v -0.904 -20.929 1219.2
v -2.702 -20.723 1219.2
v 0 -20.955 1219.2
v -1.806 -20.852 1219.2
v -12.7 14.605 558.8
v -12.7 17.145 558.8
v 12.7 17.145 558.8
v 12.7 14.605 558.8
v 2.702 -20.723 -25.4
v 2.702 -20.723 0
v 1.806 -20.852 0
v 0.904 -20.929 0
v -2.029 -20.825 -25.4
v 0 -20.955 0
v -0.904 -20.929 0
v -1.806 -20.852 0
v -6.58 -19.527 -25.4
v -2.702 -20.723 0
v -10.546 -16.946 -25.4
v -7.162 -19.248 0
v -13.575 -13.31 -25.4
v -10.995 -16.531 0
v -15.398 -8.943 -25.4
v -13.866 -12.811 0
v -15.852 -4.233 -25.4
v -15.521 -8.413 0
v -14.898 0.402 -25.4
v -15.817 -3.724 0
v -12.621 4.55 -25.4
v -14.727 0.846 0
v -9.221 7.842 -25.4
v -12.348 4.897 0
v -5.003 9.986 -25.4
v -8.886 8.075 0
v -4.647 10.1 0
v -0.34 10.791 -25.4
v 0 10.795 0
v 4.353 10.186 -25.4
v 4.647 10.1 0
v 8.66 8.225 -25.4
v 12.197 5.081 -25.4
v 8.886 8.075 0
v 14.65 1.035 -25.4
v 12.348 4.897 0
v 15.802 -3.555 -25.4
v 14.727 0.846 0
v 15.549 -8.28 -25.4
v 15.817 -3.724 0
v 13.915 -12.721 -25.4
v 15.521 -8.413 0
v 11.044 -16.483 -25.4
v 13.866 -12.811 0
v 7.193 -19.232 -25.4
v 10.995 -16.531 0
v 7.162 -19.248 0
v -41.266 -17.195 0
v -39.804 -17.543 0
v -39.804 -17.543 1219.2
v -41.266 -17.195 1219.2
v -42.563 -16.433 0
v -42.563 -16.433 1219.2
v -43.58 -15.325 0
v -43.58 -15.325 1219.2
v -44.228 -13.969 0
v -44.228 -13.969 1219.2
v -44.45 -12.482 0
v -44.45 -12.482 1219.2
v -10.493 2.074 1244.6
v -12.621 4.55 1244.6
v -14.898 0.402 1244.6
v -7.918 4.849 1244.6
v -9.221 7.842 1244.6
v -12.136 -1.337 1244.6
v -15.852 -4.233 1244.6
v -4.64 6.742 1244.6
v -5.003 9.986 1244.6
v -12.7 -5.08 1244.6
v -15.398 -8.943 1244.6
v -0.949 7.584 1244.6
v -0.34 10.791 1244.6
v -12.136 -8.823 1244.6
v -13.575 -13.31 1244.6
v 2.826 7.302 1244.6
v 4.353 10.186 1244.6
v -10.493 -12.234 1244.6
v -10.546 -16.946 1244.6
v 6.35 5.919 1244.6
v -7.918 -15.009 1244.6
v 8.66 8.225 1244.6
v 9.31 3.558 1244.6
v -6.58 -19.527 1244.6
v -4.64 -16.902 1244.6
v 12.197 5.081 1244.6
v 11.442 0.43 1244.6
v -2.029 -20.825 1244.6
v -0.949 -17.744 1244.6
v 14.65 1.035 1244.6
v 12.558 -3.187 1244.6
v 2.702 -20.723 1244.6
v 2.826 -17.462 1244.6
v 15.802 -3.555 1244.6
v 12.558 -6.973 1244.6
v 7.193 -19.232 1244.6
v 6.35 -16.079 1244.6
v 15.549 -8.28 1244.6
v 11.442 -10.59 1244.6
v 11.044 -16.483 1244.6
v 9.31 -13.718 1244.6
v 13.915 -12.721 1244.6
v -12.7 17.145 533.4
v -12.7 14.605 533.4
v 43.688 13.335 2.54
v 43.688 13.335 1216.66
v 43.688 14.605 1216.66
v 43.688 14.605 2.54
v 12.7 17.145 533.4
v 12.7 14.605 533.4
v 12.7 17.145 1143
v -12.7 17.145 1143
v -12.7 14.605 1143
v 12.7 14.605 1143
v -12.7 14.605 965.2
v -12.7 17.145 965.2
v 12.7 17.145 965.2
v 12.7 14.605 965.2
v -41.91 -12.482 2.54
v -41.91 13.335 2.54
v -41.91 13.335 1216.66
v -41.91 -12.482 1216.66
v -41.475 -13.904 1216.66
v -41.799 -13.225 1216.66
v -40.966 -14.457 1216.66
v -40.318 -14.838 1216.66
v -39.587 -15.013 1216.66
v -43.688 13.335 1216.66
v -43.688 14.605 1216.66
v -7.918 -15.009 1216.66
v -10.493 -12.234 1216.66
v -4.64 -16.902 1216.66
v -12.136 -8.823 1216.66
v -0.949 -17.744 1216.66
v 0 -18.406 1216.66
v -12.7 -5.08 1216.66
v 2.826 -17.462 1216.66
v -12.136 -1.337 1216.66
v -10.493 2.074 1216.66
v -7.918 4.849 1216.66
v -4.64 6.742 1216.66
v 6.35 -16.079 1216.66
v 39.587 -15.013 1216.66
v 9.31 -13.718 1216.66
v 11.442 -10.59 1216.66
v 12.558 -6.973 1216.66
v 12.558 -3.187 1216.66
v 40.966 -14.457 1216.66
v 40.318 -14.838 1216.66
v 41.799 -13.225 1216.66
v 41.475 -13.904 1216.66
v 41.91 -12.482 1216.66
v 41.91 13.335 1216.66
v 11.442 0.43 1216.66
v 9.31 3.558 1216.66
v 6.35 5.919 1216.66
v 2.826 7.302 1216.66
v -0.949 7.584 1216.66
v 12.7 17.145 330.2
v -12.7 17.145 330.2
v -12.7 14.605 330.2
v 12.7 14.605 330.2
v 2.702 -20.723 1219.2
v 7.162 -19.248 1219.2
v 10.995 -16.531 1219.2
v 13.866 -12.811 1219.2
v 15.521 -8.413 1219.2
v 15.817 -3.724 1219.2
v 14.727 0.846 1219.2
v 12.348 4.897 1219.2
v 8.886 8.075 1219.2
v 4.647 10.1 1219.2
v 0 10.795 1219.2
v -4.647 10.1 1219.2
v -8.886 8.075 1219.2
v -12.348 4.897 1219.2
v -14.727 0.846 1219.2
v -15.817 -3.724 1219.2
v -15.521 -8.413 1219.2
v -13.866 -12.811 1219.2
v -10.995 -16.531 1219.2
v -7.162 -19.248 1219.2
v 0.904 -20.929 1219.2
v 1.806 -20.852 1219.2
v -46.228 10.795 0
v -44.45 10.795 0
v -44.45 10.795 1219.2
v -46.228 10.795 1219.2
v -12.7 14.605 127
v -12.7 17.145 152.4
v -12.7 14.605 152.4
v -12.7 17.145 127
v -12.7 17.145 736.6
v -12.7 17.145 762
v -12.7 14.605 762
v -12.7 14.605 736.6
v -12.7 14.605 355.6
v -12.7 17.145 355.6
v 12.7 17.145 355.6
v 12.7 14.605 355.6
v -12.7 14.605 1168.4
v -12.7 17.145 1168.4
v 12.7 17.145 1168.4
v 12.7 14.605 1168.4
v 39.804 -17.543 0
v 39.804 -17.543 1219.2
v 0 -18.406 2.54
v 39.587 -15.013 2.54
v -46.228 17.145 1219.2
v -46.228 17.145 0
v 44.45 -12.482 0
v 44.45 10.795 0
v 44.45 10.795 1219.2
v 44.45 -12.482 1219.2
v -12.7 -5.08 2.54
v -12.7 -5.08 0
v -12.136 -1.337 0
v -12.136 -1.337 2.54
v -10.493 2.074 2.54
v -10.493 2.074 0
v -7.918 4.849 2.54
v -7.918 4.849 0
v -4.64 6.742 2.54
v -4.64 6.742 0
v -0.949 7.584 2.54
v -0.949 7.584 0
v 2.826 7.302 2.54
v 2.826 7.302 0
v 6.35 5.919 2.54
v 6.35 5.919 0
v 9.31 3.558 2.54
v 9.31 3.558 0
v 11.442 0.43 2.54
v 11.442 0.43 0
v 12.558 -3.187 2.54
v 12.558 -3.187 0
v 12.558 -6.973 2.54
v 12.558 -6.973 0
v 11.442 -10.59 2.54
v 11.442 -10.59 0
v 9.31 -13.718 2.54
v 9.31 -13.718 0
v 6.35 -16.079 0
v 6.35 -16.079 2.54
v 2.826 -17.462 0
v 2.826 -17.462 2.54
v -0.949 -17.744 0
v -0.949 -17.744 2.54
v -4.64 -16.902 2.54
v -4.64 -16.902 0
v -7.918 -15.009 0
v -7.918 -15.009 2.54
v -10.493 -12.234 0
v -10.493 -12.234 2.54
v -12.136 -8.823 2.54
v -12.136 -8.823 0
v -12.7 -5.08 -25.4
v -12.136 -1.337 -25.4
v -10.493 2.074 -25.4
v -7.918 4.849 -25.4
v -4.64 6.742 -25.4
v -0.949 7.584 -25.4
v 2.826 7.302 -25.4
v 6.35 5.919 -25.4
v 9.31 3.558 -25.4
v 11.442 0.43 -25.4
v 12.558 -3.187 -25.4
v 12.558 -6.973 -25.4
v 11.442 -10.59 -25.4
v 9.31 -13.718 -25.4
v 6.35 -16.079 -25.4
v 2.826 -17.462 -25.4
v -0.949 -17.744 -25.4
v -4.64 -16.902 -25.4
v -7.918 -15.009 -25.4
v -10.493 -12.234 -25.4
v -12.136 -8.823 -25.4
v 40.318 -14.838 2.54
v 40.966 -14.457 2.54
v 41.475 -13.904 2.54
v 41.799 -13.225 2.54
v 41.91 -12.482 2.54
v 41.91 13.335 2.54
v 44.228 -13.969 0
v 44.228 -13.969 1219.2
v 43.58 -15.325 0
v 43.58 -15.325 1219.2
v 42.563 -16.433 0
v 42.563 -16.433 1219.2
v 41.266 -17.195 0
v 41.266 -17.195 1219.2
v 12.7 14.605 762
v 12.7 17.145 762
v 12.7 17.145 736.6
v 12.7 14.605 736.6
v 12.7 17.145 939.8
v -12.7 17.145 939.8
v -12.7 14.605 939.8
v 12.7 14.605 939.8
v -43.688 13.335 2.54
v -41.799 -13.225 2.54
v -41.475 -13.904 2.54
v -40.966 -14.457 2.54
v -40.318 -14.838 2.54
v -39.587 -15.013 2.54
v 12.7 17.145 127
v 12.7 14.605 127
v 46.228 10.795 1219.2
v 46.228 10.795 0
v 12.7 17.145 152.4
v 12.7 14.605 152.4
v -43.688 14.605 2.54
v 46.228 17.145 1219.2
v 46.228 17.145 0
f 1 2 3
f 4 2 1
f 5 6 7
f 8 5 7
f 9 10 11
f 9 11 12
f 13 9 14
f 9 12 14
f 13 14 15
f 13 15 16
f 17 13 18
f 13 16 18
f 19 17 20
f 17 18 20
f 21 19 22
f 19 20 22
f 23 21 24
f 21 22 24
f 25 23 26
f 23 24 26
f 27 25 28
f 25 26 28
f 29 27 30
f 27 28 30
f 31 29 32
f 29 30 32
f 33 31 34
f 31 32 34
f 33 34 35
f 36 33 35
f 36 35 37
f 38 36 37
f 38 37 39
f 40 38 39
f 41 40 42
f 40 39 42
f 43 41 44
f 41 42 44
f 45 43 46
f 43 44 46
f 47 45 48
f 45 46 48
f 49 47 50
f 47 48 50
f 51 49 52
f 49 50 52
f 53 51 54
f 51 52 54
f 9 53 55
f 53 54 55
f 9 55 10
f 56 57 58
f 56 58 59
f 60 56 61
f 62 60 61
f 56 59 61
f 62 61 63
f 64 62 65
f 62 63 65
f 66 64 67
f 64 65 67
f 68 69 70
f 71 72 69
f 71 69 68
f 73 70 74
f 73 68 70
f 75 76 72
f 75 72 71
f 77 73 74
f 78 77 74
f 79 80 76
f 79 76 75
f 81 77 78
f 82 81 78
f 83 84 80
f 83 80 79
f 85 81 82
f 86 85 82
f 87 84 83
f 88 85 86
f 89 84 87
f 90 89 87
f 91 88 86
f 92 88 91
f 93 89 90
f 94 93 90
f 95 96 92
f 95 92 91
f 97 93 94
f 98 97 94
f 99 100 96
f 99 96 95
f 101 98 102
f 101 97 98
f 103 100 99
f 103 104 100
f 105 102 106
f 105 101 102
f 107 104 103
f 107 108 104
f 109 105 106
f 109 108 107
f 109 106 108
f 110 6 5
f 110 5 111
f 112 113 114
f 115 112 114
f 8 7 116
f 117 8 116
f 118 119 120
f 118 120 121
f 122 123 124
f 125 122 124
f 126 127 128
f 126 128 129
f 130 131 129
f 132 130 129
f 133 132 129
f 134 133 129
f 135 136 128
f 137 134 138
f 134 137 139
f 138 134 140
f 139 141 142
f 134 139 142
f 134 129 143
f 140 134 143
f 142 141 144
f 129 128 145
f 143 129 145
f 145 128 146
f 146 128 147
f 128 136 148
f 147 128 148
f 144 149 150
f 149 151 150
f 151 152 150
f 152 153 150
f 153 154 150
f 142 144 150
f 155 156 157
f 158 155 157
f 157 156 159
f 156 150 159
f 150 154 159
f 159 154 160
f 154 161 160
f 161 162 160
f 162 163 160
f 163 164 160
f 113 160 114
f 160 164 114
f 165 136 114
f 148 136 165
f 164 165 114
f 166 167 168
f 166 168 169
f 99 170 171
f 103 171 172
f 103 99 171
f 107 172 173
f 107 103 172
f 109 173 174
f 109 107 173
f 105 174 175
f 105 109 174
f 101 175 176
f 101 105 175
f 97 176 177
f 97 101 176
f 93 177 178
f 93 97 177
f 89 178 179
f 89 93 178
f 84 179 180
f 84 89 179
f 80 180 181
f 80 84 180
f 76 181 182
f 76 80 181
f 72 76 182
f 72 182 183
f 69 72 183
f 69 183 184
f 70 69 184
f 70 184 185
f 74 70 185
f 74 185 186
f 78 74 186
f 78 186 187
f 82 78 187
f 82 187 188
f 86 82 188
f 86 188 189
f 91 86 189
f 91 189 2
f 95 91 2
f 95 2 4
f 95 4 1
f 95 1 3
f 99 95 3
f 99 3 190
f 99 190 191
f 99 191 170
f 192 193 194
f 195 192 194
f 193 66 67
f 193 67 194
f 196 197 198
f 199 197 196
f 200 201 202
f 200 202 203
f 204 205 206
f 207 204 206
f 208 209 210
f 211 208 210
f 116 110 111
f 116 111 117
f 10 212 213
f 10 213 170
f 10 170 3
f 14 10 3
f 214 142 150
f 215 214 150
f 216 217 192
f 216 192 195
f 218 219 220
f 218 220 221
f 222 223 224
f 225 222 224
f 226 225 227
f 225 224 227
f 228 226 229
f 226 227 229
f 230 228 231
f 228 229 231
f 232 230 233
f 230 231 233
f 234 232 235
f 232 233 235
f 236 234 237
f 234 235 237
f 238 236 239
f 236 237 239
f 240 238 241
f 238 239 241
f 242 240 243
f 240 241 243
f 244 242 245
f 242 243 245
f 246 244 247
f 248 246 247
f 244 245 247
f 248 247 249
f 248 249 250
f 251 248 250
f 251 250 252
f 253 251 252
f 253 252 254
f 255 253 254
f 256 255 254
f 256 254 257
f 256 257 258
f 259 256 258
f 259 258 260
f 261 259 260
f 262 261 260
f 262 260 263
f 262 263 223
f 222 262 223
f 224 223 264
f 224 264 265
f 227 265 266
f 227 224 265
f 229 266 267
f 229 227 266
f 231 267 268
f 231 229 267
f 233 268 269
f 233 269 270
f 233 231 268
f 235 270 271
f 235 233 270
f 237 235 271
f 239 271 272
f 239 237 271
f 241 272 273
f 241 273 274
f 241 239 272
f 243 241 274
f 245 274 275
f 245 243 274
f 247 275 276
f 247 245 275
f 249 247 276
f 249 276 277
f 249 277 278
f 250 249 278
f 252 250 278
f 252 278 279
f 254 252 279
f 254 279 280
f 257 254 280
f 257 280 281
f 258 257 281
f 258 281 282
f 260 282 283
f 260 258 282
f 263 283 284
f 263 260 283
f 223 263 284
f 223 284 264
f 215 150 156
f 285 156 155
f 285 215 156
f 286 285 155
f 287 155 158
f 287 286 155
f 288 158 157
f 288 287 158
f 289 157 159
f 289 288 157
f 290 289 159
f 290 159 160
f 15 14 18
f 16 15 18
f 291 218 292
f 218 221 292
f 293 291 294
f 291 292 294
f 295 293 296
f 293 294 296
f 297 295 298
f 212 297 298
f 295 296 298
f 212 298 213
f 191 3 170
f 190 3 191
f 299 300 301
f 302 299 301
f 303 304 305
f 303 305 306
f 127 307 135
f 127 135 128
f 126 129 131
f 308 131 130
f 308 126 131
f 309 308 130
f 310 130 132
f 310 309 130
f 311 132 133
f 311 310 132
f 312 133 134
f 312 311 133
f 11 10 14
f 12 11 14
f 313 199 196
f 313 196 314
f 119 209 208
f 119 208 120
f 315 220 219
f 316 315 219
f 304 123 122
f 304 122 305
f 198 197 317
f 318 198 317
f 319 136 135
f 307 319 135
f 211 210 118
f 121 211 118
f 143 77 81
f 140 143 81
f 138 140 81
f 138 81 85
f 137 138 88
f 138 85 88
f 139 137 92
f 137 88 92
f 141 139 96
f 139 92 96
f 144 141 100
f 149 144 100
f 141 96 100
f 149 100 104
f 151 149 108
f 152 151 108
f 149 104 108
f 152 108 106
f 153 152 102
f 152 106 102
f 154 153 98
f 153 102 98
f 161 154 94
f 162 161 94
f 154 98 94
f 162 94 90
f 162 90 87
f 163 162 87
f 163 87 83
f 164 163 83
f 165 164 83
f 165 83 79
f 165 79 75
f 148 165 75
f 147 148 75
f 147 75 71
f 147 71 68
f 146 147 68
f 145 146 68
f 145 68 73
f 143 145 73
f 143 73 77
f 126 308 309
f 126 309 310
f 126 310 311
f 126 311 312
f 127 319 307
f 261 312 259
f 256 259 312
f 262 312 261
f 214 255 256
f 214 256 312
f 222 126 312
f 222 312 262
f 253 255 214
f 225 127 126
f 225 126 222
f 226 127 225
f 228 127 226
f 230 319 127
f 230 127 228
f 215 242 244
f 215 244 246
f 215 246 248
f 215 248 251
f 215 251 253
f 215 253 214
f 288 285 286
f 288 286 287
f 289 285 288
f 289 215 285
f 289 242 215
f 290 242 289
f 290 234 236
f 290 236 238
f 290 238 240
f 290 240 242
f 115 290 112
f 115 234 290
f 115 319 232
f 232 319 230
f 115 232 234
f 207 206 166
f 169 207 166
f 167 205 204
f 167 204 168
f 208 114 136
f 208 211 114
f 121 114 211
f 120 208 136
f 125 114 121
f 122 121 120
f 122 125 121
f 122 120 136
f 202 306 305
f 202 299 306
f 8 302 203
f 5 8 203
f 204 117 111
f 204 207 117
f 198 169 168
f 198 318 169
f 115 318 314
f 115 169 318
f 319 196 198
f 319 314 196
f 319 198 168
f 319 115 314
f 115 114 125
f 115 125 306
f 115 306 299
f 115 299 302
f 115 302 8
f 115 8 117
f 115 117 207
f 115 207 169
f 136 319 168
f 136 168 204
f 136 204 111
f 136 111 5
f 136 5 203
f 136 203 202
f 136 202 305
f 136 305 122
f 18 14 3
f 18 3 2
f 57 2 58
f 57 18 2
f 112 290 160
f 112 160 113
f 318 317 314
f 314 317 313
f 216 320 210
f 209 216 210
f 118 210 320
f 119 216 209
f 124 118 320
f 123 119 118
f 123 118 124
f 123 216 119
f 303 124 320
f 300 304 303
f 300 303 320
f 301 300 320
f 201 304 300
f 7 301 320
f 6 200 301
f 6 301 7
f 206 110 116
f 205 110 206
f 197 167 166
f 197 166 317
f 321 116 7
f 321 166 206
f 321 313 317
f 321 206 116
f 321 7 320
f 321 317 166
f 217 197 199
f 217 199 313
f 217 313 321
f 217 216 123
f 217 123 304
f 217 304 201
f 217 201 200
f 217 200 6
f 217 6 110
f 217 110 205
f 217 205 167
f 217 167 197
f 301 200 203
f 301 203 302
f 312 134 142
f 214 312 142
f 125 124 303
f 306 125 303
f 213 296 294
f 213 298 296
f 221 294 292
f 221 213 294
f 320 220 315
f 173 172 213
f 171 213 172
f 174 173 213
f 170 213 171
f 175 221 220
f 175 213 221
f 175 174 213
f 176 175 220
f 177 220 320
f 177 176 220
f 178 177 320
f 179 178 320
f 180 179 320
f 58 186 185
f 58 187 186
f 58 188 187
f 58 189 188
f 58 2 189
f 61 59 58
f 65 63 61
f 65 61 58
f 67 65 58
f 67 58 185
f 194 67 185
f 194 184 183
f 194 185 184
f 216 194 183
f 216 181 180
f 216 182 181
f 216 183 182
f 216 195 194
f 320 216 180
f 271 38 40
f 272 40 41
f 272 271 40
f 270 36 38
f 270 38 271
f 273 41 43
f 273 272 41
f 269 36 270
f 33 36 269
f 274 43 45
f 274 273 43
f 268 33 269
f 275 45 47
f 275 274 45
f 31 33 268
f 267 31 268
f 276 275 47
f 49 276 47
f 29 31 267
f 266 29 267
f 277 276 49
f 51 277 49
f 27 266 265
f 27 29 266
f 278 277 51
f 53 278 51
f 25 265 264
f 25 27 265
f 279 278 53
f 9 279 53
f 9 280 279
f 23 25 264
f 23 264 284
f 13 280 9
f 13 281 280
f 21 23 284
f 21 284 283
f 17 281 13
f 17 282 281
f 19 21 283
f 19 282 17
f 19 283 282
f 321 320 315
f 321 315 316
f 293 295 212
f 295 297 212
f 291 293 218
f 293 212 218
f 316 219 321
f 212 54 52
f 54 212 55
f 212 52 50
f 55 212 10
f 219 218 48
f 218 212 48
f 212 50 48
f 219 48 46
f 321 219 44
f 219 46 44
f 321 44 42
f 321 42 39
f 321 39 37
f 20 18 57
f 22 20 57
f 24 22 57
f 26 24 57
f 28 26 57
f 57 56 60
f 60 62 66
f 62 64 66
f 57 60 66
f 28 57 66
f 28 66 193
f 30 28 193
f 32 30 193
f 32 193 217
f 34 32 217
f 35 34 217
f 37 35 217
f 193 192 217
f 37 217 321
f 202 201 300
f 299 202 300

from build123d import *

# Parameters (mm, degrees)
BOSS_EXTRUDE1_DEPTH = 1219.2
SKETCH3_W           = 1219.2
SKETCH3_H           = 6.35
BOSS_EXTRUDE2_DEPTH = 1.778
SKETCH4_W           = 1219.2
SKETCH4_H           = 6.35
BOSS_EXTRUDE3_DEPTH = 1.778
FILLET1_R           = 5.08
SHELL1_START        = 2.54
SHELL1_DEPTH        = 1214.12
CUT_EXTRUDE1_REACH  = 1222.671
SKETCH6_W           = 25.4
SKETCH6_H           = 25.4
SKETCH7_R           = 15.875
SKETCH7_R_2         = 12.7
BOSS_EXTRUDE4_DEPTH = 25.4
CUT_EXTRUDE2_REACH  = 1222.256
SKETCH10_R          = 12.7
BOSS_EXTRUDE5_START = 25.4
SKETCH11_R          = 15.875
SKETCH11_R_2        = 12.7
BOSS_EXTRUDE5_DEPTH = 25.4
CUT_EXTRUDE3_REACH  = 1247.634
SKETCH12_R          = 12.7


# Read off the part's stored shape, not the designer's step: Shell1
with BuildPart() as part:
    # Sketch1 → Boss-Extrude1 (new body)
    with BuildSketch(Plane.XY):
        Polygon((-44.45, -17.145), (-44.45, 17.145), (44.45, 17.145), (44.45, -17.145), (0, -20.955), align=None)
    extrude(amount=BOSS_EXTRUDE1_DEPTH)

    # Sketch3 → Boss-Extrude2 (add)
    with BuildSketch(Plane.ZY.offset(44.45)):
        with Locations((609.6, 13.97)):
            Rectangle(SKETCH3_W, SKETCH3_H)
    extrude(amount=BOSS_EXTRUDE2_DEPTH)

    # Sketch4 → Boss-Extrude3 (add)
    with BuildSketch(Plane(origin=(44.45, 0, 0), x_dir=(0, 0, -1), z_dir=(1, 0, 0))):
        with Locations((-609.6, 13.97)):
            Rectangle(SKETCH4_W, SKETCH4_H)
    extrude(amount=BOSS_EXTRUDE3_DEPTH)

    # Fillet1
    fillet1_edges = [part.edges().sort_by_distance(p)[0] for p in [
        (44.45, -17.145, 609.6),
        (-44.45, -17.145, 609.6),
    ]]
    fillet(fillet1_edges, radius=FILLET1_R)

    # Shell1 outline → Shell1 (cut)
    with BuildSketch(Plane.XY.offset(SHELL1_START)):
        with BuildLine():
            Line((41.91, -12.481801497), (41.91, 13.335))
            Line((41.91, 13.335), (43.688, 13.335))
            Line((43.688, 13.335), (43.688, 14.605))
            Line((43.688, 14.605), (-43.688, 14.605))
            Line((-43.688, 14.605), (-43.688, 13.335))
            Line((-43.688, 13.335), (-41.91, 13.335))
            Line((-41.91, 13.335), (-41.91, -12.481801497))
            ThreePointArc((-41.91, -12.481801497), (-41.241172627, -14.199449016), (-39.586918899, -15.012521986))
            Line((-39.586918899, -15.012521986), (0, -18.405686463))
            Line((0, -18.405686463), (39.586918899, -15.012521986))
            ThreePointArc((39.586918899, -15.012521986), (41.241172627, -14.199449016), (41.91, -12.481801497))
        make_face()
    extrude(amount=SHELL1_DEPTH, mode=Mode.SUBTRACT)

    # Sketch6 → Cut-Extrude1 (cut, up to next)
    with BuildSketch(Plane(origin=(0, 17.145, 0), x_dir=(1, 0, 0), z_dir=(0, 1, 0)), mode=Mode.PRIVATE) as cut_extrude1_sk1:
        with Locations((0, -1155.7)):
            Rectangle(SKETCH6_W, SKETCH6_H)
    cut_extrude1_tool1 = extrude(cut_extrude1_sk1.sketch, amount=-CUT_EXTRUDE1_REACH, mode=Mode.PRIVATE) & part.part
    # Sketch6 → Cut-Extrude1 (cut, up to next)
    with BuildSketch(Plane(origin=(0, 17.145, 0), x_dir=(1, 0, 0), z_dir=(0, 1, 0)), mode=Mode.PRIVATE) as cut_extrude1_sk2:
        with Locations((0, -952.5)):
            Rectangle(SKETCH6_W, SKETCH6_H)
    cut_extrude1_tool2 = extrude(cut_extrude1_sk2.sketch, amount=-CUT_EXTRUDE1_REACH, mode=Mode.PRIVATE) & part.part
    # Sketch6 → Cut-Extrude1 (cut, up to next)
    with BuildSketch(Plane(origin=(0, 17.145, 0), x_dir=(1, 0, 0), z_dir=(0, 1, 0)), mode=Mode.PRIVATE) as cut_extrude1_sk3:
        with Locations((0, -749.3)):
            Rectangle(SKETCH6_W, SKETCH6_H)
    cut_extrude1_tool3 = extrude(cut_extrude1_sk3.sketch, amount=-CUT_EXTRUDE1_REACH, mode=Mode.PRIVATE) & part.part
    # Sketch6 → Cut-Extrude1 (cut, up to next)
    with BuildSketch(Plane(origin=(0, 17.145, 0), x_dir=(1, 0, 0), z_dir=(0, 1, 0)), mode=Mode.PRIVATE) as cut_extrude1_sk4:
        with Locations((0, -546.1)):
            Rectangle(SKETCH6_W, SKETCH6_H)
    cut_extrude1_tool4 = extrude(cut_extrude1_sk4.sketch, amount=-CUT_EXTRUDE1_REACH, mode=Mode.PRIVATE) & part.part
    # Sketch6 → Cut-Extrude1 (cut, up to next)
    with BuildSketch(Plane(origin=(0, 17.145, 0), x_dir=(1, 0, 0), z_dir=(0, 1, 0)), mode=Mode.PRIVATE) as cut_extrude1_sk5:
        with Locations((0, -342.9)):
            Rectangle(SKETCH6_W, SKETCH6_H)
    cut_extrude1_tool5 = extrude(cut_extrude1_sk5.sketch, amount=-CUT_EXTRUDE1_REACH, mode=Mode.PRIVATE) & part.part
    # Sketch6 → Cut-Extrude1 (cut, up to next)
    with BuildSketch(Plane(origin=(0, 17.145, 0), x_dir=(1, 0, 0), z_dir=(0, 1, 0)), mode=Mode.PRIVATE) as cut_extrude1_sk6:
        with Locations((0, -139.7)):
            Rectangle(SKETCH6_W, SKETCH6_H)
    cut_extrude1_tool6 = extrude(cut_extrude1_sk6.sketch, amount=-CUT_EXTRUDE1_REACH, mode=Mode.PRIVATE) & part.part
    add(cut_extrude1_tool1.solids().sort_by_distance((0, 17.145, 1155.7))[0], mode=Mode.SUBTRACT)
    add(cut_extrude1_tool2.solids().sort_by_distance((0, 17.145, 952.5))[0], mode=Mode.SUBTRACT)
    add(cut_extrude1_tool3.solids().sort_by_distance((0, 17.145, 749.3))[0], mode=Mode.SUBTRACT)
    add(cut_extrude1_tool4.solids().sort_by_distance((0, 17.145, 546.1))[0], mode=Mode.SUBTRACT)
    add(cut_extrude1_tool5.solids().sort_by_distance((0, 17.145, 342.9))[0], mode=Mode.SUBTRACT)
    add(cut_extrude1_tool6.solids().sort_by_distance((0, 17.145, 139.7))[0], mode=Mode.SUBTRACT)

    # Sketch7 → Boss-Extrude4 (add)
    with BuildSketch(Plane(origin=(0, 0, 0), x_dir=(-1, 0, 0), z_dir=(0, 0, -1))):
        with Locations(Location((0, -5.08, 0), (0, 0, 260.201815092))):
            Circle(SKETCH7_R)
        with Locations((0, -5.08)):
            Circle(SKETCH7_R_2, mode=Mode.SUBTRACT)
    extrude(amount=BOSS_EXTRUDE4_DEPTH)

    # Sketch10 → Cut-Extrude2 (cut, up to next)
    with BuildSketch(Plane(origin=(0, 0, 0), x_dir=(-1, 0, 0), z_dir=(0, 0, -1)), mode=Mode.PRIVATE) as cut_extrude2_sk1:
        with Locations((0, -5.08)):
            Circle(SKETCH10_R)
    cut_extrude2_tool1 = extrude(cut_extrude2_sk1.sketch, amount=-CUT_EXTRUDE2_REACH, mode=Mode.PRIVATE) & part.part
    add(cut_extrude2_tool1.solids().sort_by_distance((0, -5.08, 0))[0], mode=Mode.SUBTRACT)

    # Sketch11 → Boss-Extrude5 (add)
    with BuildSketch(Plane.XY.offset(1219.2).offset(BOSS_EXTRUDE5_START)):
        with Locations(Location((0, -5.08, 0), (0, 0, 279.798184908))):
            Circle(SKETCH11_R)
        with Locations(Location((0, -5.08, 0), (0, 0, 180))):
            Circle(SKETCH11_R_2, mode=Mode.SUBTRACT)
    extrude(amount=-BOSS_EXTRUDE5_DEPTH)

    # Sketch12 → Cut-Extrude3 (cut, up to next)
    with BuildSketch(Plane.XY.offset(1219.2), mode=Mode.PRIVATE) as cut_extrude3_sk1:
        with Locations(Location((0, -5.08, 0), (0, 0, 180))):
            Circle(SKETCH12_R)
    cut_extrude3_tool1 = extrude(cut_extrude3_sk1.sketch, amount=-CUT_EXTRUDE3_REACH, mode=Mode.PRIVATE) & part.part
    add(cut_extrude3_tool1.solids().sort_by_distance((0, -5.08, 1219.2))[0], mode=Mode.SUBTRACT)


solid = part.part
